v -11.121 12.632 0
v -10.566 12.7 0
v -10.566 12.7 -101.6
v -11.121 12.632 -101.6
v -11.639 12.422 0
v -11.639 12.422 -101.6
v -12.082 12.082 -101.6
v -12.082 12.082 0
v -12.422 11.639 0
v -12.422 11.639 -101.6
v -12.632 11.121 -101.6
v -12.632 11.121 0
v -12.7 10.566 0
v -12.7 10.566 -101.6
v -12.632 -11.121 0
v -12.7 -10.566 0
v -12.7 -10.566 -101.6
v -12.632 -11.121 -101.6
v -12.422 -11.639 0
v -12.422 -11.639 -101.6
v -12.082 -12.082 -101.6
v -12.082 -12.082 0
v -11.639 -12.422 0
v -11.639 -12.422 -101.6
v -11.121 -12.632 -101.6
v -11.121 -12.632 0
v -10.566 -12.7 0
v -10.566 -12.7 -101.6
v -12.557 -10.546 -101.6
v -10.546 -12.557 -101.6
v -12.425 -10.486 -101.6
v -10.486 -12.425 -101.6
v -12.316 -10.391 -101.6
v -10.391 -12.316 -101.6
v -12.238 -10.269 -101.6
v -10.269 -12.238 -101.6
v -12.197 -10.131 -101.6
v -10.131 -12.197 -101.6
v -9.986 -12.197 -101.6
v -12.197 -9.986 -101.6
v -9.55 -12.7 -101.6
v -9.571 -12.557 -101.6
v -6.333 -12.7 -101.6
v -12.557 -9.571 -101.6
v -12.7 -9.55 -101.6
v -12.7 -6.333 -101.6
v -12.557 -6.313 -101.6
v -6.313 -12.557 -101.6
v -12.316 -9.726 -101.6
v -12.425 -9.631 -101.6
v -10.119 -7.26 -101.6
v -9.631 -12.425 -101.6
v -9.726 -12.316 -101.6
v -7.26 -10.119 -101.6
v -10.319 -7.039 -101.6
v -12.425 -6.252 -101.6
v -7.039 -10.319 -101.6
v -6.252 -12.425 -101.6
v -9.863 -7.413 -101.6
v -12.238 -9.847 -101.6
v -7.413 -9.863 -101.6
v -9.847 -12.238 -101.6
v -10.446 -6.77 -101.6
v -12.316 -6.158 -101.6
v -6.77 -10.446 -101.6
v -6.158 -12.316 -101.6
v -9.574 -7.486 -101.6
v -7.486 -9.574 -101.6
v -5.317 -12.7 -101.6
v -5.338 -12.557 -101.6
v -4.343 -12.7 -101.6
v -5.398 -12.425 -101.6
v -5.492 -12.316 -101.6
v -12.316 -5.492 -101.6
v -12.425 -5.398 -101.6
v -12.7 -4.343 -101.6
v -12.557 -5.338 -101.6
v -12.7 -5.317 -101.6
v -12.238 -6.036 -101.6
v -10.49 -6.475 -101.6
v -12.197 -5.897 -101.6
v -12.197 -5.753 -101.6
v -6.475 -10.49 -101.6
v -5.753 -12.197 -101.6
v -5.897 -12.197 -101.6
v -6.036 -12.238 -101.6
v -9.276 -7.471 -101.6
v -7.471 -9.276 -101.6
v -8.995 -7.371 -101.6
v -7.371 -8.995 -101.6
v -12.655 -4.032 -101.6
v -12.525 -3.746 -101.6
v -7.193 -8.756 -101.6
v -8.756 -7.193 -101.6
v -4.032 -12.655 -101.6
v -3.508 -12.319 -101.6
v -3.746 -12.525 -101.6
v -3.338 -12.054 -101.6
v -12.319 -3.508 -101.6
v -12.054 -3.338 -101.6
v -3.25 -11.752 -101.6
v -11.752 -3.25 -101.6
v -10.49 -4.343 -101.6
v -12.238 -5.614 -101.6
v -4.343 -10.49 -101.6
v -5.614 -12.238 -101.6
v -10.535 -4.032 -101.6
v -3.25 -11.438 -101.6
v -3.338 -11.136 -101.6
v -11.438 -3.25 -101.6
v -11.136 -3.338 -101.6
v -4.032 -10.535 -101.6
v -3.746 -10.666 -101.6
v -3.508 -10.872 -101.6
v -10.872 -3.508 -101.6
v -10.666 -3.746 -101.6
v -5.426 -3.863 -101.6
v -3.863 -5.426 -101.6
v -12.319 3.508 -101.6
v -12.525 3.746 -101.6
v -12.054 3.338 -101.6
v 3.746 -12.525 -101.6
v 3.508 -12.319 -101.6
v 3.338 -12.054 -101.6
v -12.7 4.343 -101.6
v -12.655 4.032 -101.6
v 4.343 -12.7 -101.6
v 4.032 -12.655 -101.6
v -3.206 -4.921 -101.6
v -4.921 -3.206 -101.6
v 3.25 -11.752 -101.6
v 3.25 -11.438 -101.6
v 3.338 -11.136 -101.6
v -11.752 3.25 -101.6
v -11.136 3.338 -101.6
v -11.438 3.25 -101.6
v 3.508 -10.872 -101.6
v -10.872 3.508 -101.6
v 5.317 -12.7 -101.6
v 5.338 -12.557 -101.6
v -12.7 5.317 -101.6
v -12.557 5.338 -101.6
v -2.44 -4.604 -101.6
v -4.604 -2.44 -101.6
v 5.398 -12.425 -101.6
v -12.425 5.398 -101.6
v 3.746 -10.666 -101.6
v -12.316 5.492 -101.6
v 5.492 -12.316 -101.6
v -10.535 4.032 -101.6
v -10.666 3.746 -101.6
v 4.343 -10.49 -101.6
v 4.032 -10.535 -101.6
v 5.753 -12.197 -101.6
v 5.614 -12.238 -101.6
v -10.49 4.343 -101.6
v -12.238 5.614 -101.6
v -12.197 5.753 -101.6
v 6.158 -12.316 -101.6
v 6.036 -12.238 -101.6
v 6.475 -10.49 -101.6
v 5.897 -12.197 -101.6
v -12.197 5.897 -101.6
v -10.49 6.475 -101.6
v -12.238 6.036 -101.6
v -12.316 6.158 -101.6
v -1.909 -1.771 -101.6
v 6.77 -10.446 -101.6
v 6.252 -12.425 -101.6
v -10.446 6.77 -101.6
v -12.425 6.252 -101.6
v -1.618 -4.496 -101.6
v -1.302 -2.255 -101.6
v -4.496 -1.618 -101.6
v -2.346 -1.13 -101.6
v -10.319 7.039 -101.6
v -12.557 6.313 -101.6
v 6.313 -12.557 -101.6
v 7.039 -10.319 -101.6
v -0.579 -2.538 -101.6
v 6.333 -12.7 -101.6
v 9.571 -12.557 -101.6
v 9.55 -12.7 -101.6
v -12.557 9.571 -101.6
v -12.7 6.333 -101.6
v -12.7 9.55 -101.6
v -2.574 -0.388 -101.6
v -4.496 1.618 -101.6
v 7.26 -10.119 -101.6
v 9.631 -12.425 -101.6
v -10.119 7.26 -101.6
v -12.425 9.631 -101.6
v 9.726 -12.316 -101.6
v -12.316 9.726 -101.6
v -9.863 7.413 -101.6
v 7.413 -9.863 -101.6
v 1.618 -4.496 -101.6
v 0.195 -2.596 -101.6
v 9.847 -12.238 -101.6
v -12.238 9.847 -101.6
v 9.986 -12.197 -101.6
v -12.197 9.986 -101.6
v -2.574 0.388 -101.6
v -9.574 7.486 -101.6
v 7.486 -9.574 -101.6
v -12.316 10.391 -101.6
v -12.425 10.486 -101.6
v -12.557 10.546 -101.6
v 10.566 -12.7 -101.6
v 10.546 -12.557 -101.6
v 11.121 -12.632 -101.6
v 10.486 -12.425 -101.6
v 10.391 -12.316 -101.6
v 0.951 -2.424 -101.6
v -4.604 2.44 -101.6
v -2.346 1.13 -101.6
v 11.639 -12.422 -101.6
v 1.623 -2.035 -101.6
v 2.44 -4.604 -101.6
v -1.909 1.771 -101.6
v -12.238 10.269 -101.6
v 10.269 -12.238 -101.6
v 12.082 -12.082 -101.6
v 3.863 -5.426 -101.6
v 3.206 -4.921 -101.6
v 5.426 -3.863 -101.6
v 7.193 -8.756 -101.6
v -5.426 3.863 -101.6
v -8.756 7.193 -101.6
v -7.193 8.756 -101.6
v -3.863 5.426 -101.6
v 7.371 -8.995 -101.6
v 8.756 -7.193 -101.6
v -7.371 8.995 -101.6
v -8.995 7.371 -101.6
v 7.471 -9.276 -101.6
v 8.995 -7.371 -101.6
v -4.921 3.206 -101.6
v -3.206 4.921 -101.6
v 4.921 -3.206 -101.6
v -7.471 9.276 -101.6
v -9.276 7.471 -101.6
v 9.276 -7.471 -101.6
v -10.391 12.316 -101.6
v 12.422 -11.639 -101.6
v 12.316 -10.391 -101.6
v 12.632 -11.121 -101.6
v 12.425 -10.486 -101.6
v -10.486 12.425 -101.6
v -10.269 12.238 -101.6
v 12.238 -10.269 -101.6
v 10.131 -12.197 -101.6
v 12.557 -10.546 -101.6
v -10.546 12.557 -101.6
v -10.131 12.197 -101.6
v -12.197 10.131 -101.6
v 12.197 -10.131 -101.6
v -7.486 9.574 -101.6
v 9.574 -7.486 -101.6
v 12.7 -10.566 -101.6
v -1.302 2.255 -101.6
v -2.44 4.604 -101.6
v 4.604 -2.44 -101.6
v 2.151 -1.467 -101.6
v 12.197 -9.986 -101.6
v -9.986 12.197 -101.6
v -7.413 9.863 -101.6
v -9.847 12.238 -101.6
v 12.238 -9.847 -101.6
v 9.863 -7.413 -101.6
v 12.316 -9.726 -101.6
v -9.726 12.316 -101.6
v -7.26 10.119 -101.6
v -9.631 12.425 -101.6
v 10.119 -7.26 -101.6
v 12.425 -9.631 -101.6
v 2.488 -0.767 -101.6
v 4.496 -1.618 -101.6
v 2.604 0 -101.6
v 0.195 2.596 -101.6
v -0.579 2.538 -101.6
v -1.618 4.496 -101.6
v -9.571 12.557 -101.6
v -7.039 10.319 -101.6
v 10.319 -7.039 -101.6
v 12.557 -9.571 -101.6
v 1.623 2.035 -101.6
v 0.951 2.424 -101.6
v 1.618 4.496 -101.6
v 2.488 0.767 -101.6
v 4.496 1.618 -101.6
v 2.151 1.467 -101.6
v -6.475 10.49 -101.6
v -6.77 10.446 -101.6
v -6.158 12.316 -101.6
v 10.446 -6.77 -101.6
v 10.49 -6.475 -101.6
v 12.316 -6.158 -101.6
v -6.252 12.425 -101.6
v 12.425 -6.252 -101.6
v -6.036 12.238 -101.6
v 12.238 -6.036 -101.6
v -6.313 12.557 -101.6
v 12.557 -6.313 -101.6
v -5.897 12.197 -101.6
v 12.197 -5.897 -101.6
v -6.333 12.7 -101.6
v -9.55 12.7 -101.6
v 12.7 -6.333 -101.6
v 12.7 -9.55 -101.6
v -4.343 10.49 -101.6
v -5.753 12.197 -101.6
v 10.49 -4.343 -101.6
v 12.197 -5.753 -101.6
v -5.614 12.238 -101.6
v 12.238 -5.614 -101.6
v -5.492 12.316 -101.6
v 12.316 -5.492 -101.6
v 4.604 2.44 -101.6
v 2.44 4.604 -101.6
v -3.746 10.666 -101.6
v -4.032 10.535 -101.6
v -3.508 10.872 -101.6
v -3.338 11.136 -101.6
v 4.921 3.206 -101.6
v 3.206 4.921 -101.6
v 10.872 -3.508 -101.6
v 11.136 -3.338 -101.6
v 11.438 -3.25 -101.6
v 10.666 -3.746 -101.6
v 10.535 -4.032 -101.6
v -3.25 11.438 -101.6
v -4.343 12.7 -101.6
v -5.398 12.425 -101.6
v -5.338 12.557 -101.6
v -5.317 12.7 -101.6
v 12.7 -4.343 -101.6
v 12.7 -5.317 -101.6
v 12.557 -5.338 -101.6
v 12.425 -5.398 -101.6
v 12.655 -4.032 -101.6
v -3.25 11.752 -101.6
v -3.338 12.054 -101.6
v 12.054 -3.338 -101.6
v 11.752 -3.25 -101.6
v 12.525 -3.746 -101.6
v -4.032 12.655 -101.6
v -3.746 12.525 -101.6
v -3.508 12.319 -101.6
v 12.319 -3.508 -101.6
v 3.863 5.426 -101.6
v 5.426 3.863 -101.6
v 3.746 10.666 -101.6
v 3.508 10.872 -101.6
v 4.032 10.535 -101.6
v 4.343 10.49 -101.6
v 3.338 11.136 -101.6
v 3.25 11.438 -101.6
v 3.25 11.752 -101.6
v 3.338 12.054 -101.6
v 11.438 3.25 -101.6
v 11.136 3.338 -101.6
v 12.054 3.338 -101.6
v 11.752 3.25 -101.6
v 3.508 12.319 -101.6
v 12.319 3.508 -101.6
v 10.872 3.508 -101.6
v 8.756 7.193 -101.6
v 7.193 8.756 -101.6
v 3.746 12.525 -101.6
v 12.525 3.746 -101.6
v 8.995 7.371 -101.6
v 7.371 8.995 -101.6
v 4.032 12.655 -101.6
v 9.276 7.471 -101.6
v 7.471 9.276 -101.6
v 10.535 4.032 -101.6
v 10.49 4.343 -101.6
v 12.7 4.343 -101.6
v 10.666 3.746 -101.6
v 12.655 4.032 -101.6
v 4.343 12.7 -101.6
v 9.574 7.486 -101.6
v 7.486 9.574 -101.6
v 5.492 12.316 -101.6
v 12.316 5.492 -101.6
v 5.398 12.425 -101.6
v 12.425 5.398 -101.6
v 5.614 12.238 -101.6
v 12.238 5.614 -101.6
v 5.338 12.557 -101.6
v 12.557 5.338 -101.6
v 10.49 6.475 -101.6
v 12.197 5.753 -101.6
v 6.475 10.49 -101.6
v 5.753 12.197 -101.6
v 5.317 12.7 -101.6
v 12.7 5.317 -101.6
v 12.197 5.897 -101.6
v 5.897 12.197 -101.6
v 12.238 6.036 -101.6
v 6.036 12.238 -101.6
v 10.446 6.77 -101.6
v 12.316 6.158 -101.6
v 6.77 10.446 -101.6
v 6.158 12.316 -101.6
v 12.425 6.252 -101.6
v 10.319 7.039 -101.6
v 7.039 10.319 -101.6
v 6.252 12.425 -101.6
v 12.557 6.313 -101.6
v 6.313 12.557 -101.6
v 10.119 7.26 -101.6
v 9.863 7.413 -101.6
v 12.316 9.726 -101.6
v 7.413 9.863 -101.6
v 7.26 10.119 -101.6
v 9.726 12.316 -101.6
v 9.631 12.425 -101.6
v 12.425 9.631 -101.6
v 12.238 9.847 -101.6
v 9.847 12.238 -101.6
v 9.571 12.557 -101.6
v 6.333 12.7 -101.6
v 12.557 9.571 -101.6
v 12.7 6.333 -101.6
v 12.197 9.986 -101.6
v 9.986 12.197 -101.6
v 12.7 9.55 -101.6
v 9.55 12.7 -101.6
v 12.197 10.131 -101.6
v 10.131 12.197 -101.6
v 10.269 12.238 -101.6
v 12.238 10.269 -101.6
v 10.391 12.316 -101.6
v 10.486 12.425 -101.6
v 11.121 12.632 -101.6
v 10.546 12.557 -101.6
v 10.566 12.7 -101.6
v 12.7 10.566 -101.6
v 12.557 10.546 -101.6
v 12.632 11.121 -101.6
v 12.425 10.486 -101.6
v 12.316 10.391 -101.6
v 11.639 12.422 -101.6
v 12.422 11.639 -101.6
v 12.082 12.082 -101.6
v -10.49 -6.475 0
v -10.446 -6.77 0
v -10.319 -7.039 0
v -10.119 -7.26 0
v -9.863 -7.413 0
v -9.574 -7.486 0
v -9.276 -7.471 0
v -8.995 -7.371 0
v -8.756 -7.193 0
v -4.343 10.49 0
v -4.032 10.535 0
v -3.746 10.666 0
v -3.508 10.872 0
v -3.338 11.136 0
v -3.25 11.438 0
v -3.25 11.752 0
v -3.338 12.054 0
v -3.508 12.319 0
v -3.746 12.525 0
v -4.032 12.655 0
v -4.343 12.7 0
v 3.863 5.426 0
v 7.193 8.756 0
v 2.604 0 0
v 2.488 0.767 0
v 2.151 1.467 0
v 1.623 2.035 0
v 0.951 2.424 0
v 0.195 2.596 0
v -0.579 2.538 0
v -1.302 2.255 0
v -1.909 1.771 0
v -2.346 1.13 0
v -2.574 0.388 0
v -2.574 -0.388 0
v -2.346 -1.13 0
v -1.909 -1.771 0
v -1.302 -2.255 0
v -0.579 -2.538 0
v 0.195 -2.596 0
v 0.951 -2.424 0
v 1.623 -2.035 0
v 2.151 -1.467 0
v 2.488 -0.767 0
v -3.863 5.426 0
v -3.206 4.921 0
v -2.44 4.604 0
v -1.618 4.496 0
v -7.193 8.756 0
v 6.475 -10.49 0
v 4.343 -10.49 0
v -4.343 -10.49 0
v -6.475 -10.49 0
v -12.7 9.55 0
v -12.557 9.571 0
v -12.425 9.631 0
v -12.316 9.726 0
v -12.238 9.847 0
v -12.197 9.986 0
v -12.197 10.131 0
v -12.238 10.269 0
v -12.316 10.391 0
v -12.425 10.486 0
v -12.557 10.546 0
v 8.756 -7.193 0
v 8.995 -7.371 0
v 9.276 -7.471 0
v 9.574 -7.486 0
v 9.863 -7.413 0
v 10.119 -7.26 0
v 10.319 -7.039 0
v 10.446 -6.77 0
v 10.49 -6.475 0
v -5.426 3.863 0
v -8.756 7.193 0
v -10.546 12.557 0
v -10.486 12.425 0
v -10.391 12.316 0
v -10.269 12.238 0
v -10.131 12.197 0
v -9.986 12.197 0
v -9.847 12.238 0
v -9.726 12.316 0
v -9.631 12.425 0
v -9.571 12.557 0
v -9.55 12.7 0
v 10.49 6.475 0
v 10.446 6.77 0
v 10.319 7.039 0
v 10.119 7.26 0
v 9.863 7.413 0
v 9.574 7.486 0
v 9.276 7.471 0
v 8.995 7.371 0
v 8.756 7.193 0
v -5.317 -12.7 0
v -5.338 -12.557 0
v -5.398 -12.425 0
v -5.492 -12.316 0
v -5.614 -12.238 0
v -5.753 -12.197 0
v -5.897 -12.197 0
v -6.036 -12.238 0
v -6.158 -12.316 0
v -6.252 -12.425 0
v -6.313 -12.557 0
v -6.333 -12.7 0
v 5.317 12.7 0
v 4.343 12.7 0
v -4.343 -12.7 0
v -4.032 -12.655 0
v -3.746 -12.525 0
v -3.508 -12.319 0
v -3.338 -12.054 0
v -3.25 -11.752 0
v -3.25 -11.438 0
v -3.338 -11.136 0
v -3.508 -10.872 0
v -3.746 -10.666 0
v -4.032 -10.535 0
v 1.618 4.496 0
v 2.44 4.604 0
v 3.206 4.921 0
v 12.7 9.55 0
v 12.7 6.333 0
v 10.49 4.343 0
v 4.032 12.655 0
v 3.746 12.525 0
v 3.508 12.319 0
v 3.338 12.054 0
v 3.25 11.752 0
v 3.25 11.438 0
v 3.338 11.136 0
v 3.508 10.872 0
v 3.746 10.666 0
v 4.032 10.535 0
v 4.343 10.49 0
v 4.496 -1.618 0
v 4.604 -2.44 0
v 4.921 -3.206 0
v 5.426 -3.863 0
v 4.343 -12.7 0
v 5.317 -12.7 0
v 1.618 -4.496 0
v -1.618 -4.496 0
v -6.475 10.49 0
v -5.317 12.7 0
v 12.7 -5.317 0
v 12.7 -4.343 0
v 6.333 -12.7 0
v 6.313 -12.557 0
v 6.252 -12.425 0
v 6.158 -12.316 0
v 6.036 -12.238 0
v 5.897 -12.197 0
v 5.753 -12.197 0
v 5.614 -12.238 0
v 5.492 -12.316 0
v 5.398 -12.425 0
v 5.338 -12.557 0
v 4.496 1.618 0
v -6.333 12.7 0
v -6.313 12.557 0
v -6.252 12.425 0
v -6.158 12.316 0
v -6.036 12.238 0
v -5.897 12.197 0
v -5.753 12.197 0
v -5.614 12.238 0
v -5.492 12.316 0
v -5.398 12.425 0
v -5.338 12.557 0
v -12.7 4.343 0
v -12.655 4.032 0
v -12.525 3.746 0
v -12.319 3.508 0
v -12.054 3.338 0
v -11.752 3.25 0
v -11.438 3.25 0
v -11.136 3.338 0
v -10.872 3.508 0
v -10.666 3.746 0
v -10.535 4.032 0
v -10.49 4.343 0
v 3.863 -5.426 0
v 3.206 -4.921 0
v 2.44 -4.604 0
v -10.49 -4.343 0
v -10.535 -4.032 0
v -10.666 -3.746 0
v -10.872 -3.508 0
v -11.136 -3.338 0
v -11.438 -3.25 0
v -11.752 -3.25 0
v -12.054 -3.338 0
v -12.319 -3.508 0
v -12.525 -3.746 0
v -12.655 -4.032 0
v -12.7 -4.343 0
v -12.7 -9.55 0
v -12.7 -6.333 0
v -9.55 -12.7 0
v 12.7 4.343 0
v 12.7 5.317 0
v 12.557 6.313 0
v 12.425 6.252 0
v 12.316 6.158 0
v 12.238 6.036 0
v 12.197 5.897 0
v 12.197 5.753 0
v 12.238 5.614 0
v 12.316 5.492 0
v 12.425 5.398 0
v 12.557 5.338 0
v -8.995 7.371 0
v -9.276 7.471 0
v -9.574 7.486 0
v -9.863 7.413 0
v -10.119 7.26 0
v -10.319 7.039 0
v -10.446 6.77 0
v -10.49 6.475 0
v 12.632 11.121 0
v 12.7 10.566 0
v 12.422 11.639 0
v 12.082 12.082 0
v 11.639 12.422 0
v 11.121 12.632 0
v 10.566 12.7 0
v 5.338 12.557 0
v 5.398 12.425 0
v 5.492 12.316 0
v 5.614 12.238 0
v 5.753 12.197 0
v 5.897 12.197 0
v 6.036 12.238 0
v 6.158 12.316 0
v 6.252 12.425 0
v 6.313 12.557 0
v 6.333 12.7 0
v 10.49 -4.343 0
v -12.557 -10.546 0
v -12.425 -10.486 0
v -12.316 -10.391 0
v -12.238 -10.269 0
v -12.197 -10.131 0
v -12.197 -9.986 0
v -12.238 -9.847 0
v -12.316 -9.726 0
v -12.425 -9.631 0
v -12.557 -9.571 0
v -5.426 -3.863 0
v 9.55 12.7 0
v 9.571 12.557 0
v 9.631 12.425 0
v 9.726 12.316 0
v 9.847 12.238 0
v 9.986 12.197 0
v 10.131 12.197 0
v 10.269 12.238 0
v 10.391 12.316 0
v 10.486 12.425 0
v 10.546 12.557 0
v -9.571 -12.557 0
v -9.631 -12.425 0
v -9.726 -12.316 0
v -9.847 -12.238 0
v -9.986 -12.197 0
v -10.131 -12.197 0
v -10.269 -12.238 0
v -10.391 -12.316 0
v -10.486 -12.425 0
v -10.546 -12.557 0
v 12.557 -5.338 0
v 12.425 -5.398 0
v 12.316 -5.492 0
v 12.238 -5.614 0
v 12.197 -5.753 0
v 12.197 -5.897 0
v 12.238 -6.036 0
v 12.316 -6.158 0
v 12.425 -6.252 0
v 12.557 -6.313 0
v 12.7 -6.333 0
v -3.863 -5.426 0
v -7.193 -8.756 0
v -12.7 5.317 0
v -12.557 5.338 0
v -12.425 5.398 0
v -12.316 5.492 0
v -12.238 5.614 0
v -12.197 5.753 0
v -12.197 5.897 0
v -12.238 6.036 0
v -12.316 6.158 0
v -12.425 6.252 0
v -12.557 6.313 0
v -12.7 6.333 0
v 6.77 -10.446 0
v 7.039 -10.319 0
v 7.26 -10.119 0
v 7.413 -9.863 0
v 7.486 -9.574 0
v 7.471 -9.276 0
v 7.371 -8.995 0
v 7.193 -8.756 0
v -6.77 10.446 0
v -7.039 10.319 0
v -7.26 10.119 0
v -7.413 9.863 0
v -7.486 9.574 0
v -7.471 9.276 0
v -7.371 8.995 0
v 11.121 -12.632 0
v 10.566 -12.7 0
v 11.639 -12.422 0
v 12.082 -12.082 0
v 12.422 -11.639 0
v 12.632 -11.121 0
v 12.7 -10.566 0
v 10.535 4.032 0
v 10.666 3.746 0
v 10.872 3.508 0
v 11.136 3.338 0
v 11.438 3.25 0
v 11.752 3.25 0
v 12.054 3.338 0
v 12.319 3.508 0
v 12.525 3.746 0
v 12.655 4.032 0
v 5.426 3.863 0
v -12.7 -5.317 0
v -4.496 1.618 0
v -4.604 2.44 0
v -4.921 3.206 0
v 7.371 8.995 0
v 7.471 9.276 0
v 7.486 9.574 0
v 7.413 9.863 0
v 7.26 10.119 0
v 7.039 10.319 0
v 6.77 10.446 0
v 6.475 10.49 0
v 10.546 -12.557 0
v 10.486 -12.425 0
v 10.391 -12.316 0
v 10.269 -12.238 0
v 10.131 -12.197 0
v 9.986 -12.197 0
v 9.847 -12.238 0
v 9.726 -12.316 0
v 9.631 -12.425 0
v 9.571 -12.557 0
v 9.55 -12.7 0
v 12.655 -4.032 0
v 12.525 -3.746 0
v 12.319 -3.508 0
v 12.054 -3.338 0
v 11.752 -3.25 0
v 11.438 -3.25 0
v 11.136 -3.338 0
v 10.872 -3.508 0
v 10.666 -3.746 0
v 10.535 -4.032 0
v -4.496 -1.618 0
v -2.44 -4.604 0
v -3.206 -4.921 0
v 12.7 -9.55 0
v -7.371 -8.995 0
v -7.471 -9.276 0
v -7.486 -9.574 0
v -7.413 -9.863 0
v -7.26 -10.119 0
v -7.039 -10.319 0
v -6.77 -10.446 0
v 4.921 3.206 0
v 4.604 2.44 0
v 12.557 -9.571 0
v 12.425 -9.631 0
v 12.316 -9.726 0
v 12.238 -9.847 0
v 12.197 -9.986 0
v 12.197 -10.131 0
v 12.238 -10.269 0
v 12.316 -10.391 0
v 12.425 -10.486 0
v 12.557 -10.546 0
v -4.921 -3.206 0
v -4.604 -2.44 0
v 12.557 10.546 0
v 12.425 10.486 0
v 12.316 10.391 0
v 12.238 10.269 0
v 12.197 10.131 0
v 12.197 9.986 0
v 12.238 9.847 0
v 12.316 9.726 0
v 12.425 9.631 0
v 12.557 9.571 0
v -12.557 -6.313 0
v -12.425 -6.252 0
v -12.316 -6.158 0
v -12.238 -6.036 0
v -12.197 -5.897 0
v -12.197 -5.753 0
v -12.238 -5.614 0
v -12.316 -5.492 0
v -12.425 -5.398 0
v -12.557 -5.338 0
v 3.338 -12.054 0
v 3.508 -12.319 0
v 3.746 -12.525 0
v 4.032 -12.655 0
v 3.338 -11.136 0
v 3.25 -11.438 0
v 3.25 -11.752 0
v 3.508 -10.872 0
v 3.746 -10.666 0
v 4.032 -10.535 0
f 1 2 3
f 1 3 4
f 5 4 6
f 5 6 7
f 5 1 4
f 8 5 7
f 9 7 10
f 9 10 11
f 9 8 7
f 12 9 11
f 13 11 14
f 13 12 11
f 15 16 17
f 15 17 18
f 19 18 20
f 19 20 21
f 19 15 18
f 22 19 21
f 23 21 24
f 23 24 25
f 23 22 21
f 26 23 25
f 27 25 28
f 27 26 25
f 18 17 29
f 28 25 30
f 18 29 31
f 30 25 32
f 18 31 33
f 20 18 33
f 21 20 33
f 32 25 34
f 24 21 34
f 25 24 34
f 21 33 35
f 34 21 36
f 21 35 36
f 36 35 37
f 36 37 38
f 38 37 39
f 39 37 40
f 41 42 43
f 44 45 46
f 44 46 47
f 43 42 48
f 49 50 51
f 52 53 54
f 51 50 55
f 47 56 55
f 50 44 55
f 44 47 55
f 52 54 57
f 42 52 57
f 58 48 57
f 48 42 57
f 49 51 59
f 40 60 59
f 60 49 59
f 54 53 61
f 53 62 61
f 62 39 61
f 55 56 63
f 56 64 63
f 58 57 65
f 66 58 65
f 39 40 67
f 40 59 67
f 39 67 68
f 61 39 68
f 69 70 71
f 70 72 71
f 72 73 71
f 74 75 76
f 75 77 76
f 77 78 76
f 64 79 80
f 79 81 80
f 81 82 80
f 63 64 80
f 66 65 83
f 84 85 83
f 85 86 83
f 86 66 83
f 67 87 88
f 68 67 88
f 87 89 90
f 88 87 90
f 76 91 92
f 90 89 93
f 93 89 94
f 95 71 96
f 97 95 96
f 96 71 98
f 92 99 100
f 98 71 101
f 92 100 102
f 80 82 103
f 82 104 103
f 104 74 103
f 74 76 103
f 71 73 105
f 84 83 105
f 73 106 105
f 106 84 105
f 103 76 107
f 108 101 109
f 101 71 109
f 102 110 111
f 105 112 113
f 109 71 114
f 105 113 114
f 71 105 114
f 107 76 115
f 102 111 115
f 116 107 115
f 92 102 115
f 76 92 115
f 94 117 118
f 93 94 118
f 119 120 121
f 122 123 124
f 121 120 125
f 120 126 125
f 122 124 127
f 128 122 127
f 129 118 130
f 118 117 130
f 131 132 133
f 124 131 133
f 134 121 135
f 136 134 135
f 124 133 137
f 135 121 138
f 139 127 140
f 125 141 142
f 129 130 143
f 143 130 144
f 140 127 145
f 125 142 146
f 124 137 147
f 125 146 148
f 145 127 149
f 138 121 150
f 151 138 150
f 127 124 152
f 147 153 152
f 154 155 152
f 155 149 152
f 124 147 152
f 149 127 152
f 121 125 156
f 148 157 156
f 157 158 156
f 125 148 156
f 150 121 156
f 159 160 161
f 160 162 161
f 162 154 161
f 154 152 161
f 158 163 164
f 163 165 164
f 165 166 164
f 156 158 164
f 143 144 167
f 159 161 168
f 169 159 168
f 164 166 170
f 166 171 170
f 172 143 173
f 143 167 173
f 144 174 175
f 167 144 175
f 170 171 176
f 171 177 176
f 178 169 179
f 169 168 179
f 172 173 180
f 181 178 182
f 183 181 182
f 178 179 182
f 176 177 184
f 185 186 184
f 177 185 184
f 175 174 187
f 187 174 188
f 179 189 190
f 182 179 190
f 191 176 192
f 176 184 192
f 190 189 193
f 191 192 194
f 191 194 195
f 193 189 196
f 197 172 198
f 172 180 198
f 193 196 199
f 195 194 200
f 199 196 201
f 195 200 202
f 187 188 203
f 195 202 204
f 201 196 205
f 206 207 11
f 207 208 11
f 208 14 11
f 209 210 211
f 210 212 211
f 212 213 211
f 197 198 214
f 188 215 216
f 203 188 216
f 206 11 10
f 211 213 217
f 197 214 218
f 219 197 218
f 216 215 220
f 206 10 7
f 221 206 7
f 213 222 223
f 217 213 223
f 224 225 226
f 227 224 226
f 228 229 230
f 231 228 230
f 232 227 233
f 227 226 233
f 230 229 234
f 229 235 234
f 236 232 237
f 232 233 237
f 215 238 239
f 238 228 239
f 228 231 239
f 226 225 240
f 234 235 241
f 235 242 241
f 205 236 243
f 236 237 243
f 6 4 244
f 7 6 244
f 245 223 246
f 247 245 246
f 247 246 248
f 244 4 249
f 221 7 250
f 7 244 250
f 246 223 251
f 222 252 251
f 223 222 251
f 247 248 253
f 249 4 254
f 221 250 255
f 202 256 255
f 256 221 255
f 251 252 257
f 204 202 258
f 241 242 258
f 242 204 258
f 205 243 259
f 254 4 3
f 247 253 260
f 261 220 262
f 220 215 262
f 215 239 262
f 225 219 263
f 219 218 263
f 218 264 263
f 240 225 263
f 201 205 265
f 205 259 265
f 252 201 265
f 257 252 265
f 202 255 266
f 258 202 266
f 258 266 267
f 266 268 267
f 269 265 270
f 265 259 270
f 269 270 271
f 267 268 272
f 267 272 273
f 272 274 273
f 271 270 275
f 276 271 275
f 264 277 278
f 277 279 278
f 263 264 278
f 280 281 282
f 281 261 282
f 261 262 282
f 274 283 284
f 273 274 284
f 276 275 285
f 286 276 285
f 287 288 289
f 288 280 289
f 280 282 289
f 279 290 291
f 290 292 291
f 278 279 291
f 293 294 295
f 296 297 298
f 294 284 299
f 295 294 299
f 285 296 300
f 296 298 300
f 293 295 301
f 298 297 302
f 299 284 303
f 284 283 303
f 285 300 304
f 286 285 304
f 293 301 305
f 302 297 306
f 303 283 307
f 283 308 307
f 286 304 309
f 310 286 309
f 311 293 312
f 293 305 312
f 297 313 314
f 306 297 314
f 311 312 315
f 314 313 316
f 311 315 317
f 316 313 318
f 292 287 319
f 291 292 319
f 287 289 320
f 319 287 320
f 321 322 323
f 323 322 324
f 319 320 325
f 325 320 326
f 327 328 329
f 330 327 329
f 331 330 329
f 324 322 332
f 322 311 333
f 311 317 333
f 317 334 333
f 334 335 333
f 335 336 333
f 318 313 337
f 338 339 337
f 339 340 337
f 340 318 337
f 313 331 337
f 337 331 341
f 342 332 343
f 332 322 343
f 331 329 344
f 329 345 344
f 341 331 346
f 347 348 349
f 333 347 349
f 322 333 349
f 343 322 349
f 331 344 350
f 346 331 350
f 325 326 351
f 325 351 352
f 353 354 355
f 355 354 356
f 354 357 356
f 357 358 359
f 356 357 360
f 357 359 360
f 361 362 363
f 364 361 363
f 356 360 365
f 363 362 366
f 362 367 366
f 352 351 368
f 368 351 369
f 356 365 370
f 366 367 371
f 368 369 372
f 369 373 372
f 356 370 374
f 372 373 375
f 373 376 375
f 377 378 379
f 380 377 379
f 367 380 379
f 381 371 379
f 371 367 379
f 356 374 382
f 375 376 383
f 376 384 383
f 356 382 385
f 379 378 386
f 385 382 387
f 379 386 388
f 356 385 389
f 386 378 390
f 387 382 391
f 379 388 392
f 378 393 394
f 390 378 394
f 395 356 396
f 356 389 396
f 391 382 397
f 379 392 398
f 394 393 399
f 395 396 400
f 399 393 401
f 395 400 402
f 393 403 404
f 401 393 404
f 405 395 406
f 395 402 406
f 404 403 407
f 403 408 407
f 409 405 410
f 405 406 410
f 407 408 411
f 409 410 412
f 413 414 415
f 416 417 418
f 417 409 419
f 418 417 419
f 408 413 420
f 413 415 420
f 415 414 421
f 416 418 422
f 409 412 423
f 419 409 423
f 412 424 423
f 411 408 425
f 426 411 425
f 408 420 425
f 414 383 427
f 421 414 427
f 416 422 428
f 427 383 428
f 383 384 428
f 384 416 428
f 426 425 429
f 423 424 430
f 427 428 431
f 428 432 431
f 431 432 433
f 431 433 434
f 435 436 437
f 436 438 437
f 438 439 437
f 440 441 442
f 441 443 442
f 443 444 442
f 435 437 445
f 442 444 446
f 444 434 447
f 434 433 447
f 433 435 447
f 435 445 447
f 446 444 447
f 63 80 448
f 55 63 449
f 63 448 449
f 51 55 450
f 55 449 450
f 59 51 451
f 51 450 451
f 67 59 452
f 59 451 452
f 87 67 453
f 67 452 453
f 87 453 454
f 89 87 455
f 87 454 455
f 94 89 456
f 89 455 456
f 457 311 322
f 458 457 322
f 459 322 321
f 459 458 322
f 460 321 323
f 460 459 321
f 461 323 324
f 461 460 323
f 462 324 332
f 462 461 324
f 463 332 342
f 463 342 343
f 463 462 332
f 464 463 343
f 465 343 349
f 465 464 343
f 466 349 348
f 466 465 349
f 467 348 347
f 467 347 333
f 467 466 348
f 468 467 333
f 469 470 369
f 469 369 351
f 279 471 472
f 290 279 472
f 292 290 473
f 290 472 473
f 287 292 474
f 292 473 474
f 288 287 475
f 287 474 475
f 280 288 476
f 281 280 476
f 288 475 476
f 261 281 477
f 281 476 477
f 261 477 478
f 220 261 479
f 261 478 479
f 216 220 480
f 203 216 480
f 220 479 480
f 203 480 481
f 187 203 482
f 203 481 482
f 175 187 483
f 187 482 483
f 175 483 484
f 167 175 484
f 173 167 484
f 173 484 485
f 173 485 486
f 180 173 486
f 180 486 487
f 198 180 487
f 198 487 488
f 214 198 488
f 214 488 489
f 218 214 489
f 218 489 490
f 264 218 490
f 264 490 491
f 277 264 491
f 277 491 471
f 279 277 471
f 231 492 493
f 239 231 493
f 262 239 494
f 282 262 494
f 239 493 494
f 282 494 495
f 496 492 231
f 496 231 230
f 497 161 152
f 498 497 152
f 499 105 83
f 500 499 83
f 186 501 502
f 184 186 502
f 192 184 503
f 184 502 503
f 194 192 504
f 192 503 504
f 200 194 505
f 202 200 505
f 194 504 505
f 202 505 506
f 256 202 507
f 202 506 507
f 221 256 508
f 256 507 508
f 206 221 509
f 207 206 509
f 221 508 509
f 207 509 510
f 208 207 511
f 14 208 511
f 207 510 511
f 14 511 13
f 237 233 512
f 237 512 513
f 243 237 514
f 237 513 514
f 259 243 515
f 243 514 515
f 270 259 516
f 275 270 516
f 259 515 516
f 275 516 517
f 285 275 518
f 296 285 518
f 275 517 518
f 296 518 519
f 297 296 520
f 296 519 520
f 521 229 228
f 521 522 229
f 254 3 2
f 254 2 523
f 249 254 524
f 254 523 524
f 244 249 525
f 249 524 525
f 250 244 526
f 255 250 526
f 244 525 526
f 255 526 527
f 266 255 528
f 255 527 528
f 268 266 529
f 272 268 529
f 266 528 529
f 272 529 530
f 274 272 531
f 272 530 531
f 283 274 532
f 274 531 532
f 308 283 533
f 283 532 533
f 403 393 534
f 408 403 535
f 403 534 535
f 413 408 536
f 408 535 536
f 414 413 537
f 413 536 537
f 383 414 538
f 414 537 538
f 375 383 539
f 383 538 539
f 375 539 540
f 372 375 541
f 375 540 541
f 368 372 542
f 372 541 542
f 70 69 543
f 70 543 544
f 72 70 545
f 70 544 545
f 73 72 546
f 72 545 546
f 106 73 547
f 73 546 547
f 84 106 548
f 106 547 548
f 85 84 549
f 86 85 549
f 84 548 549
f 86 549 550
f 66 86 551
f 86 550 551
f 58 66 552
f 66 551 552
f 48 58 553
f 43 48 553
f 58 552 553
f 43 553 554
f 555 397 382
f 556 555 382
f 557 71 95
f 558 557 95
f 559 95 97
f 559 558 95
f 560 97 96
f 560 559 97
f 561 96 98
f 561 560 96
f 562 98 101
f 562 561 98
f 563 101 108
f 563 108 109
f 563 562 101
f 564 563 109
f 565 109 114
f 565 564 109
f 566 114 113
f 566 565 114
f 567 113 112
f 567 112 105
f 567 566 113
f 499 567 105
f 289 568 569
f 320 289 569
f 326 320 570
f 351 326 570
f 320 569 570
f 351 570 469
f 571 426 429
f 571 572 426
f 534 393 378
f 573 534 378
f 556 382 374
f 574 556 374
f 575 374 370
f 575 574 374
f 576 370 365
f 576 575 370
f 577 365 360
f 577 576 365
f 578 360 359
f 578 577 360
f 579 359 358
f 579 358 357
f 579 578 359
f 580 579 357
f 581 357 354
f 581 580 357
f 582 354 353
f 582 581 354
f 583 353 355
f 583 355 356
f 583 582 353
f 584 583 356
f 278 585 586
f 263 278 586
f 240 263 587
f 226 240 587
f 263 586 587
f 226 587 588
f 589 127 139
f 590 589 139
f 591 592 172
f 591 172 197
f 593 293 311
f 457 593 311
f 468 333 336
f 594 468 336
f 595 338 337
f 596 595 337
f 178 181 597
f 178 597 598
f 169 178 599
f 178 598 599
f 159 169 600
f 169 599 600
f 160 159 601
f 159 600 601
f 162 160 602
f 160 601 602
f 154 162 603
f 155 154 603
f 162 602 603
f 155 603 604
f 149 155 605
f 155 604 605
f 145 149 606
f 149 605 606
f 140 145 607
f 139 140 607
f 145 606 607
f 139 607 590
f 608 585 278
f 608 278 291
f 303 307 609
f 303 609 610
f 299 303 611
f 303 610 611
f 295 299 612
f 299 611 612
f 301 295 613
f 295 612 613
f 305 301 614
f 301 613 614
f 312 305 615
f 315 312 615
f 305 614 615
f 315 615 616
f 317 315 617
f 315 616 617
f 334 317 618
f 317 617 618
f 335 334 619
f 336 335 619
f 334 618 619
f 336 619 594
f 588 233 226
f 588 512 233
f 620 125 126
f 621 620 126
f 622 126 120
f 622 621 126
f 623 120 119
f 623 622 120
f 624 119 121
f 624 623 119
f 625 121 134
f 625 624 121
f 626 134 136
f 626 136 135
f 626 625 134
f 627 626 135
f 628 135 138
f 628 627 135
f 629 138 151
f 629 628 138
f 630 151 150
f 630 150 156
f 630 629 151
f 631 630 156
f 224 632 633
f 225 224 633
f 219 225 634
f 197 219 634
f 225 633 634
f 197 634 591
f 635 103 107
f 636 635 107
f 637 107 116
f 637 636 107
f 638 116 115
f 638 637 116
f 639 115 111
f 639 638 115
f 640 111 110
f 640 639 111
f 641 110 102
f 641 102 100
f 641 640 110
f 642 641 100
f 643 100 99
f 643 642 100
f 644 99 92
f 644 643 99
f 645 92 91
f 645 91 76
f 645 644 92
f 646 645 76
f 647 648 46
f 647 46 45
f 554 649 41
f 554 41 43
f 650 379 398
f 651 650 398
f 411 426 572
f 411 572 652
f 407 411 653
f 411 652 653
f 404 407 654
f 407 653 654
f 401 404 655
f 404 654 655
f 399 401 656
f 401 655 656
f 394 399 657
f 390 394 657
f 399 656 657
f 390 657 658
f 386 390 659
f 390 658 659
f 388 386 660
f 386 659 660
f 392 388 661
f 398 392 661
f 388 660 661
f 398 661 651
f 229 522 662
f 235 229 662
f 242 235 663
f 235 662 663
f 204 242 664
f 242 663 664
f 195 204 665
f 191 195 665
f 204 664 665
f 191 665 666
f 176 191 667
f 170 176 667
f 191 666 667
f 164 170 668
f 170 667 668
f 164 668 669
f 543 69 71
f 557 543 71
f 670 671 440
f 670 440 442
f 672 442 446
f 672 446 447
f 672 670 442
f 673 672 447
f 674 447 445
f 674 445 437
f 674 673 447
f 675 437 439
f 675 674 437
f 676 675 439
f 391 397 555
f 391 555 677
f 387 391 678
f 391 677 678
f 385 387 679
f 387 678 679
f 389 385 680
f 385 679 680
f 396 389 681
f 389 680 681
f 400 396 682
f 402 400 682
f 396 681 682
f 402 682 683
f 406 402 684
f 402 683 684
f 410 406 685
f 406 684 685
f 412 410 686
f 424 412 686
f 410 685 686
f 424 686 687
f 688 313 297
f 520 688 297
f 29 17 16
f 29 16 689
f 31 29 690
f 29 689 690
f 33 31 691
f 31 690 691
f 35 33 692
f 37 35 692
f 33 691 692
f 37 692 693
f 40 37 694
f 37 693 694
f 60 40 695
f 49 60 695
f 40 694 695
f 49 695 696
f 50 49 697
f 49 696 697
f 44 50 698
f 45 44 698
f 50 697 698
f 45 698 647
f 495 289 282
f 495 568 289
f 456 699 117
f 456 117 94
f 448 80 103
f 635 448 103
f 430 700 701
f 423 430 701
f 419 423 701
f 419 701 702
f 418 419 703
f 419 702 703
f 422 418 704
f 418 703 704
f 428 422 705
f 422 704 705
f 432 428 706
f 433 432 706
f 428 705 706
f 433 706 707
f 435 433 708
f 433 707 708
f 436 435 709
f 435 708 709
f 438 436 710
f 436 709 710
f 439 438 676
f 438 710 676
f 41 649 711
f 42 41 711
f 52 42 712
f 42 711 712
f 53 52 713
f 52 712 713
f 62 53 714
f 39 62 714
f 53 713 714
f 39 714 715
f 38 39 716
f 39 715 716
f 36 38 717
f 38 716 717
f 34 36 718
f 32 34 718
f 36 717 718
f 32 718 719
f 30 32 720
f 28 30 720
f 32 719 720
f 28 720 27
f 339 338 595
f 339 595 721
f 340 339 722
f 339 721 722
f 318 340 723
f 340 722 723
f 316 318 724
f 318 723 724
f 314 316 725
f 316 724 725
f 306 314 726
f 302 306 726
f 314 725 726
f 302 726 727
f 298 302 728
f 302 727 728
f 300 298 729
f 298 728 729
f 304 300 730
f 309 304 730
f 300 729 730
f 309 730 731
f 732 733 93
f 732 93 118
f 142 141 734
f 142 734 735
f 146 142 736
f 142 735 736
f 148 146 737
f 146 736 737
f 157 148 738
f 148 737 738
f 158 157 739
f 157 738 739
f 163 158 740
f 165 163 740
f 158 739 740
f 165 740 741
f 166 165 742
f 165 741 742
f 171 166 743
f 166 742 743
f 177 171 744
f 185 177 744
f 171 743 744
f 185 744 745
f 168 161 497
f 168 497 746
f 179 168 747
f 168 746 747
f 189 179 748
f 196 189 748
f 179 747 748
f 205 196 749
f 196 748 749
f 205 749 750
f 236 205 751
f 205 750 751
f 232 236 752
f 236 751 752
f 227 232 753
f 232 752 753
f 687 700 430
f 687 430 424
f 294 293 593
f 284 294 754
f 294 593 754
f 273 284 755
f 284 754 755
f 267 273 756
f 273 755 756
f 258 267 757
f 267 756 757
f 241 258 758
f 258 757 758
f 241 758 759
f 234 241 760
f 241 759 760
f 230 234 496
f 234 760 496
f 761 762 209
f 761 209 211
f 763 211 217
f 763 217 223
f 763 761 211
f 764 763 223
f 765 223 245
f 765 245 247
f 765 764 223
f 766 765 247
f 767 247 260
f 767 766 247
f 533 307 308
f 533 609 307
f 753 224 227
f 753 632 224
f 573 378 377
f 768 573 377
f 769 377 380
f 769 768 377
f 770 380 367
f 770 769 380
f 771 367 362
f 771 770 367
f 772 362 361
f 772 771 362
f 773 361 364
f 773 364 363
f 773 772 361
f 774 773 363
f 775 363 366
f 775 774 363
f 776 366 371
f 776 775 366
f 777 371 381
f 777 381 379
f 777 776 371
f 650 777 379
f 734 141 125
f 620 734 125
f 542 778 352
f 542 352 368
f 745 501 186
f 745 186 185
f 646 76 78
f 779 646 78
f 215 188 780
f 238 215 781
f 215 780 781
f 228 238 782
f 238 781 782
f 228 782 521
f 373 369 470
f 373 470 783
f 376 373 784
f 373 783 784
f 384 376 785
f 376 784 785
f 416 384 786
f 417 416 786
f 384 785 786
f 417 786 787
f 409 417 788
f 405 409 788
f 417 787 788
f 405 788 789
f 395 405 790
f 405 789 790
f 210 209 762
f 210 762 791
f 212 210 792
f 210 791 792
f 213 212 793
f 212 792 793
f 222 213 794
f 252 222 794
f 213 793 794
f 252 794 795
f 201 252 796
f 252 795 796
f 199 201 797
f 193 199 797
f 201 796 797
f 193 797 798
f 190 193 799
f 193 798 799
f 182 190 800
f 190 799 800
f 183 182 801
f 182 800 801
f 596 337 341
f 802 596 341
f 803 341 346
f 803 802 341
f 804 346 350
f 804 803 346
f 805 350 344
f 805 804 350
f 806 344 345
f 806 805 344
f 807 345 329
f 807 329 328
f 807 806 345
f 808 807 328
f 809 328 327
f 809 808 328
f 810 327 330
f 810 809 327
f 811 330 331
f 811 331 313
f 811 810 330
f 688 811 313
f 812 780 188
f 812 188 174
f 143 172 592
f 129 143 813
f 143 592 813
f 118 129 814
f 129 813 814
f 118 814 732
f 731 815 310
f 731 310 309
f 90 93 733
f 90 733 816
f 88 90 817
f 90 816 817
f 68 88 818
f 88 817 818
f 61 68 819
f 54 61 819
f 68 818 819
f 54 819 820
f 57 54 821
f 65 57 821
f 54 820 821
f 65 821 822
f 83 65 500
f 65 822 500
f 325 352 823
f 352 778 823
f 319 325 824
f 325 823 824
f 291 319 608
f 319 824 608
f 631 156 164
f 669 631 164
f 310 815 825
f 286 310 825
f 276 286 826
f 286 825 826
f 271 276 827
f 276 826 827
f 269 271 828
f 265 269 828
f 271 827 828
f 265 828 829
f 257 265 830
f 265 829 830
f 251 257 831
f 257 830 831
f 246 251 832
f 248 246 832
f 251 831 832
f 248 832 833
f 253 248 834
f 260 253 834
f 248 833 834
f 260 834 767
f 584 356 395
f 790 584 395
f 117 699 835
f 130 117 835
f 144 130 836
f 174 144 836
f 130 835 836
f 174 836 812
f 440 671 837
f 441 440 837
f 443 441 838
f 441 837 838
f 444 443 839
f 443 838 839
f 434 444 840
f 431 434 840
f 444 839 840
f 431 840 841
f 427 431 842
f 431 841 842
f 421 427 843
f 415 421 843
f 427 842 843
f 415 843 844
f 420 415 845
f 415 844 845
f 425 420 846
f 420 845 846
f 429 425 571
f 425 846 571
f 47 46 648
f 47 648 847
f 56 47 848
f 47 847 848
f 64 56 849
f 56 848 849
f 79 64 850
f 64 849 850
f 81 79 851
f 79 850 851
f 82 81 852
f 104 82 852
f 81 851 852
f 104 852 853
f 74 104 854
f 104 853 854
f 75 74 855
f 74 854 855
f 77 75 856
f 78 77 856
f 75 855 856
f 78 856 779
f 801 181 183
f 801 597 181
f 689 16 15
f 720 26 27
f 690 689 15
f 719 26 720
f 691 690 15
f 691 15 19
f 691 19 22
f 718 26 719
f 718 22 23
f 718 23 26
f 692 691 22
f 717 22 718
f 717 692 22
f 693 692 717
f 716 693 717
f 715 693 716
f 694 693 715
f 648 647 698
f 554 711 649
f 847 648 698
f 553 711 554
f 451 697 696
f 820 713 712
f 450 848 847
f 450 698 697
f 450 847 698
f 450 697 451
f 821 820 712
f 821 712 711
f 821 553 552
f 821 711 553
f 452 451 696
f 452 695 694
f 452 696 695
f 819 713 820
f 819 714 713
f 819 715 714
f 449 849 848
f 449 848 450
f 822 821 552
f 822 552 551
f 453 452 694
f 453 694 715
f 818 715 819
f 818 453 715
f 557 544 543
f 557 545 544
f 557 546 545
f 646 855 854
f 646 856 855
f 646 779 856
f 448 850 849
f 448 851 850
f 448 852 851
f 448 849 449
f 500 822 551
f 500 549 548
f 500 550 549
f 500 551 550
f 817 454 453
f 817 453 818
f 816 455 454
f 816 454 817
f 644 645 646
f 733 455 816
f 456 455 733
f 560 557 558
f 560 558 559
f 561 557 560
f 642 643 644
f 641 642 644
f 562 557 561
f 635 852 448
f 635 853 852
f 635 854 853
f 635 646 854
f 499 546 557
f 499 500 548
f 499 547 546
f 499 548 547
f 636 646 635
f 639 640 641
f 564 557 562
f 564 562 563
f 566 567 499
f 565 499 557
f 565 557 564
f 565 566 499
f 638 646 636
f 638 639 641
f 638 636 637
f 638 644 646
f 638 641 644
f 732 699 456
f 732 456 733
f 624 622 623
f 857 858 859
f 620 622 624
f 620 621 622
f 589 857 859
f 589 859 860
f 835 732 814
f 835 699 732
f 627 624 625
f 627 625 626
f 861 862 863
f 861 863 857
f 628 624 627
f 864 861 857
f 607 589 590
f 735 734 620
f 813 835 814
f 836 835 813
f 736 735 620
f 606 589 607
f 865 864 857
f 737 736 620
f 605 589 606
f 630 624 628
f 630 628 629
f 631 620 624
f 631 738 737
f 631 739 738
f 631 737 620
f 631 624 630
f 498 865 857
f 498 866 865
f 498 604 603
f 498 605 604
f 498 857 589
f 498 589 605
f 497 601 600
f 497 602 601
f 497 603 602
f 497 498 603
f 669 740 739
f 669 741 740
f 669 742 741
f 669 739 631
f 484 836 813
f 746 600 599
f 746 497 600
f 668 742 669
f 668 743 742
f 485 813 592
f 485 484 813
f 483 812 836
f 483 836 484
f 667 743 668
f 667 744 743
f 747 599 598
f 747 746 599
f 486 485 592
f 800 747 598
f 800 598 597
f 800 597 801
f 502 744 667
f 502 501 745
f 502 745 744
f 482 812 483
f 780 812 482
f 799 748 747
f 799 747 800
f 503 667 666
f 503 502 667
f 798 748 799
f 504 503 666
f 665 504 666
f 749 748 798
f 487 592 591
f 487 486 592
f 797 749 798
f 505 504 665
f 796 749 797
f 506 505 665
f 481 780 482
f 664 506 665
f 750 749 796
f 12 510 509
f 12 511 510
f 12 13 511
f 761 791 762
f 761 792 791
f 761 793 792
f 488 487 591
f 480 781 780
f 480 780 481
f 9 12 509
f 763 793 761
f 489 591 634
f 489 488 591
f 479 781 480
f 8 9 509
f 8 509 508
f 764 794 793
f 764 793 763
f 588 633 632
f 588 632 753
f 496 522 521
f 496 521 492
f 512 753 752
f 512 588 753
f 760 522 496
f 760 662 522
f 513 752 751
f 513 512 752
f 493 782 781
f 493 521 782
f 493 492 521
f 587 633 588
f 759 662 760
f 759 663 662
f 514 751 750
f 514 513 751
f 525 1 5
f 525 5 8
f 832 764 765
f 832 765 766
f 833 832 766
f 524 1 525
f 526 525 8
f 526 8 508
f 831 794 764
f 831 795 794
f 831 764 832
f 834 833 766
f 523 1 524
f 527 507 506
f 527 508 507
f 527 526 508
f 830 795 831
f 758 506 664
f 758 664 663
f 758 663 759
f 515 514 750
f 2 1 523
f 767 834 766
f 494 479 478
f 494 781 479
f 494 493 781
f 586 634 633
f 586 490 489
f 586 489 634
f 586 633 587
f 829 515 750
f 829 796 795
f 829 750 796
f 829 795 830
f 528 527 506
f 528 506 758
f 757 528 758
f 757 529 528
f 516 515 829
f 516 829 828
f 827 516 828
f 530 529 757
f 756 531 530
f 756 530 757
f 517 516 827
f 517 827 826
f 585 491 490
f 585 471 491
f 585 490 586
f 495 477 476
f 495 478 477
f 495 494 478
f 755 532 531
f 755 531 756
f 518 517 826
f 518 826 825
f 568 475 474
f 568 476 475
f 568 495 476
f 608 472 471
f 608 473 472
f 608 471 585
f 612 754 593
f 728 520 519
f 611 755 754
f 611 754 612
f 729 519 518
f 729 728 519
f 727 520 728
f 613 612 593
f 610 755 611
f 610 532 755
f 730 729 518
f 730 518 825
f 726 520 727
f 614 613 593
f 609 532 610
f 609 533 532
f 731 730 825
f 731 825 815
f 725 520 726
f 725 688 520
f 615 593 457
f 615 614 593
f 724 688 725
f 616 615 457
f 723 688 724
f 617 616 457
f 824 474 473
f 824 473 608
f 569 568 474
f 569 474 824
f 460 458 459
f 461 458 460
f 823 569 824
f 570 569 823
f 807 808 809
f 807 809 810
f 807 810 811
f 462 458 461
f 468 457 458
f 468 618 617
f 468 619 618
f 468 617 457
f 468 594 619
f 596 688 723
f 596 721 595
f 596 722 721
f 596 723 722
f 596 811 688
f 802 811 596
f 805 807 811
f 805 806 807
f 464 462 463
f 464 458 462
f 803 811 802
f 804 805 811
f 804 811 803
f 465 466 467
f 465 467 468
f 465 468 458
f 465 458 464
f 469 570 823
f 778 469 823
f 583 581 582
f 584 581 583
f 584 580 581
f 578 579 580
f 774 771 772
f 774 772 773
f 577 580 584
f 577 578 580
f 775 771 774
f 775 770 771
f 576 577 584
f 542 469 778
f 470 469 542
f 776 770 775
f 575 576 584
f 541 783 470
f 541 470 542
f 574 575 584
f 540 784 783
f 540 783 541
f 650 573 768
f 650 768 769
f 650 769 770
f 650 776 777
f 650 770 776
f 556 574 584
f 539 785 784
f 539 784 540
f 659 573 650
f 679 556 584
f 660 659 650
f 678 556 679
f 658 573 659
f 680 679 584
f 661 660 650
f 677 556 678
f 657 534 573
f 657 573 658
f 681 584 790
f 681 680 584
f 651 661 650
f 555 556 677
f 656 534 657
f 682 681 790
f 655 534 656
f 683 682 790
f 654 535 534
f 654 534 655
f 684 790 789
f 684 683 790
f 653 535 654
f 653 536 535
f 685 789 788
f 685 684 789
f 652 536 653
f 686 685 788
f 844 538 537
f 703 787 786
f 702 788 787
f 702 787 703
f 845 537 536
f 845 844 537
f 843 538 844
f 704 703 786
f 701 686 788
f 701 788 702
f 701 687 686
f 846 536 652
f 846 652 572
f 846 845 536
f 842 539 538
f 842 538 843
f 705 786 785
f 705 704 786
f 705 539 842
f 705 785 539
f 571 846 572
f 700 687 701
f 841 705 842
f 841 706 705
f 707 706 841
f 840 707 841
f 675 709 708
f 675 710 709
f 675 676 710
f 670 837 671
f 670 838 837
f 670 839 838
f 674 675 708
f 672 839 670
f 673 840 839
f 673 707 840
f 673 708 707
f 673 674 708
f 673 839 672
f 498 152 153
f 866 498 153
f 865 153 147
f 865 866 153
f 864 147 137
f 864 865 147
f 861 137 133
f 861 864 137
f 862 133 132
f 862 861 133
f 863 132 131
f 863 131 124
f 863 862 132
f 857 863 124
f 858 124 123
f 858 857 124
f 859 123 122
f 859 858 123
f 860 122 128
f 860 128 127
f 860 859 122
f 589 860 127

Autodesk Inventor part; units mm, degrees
ref_plane "YZ Plane" through (0, 0, 0) normal (1, 0, 0) x (0, 1, 0)
ref_plane "XZ Plane" through (0, 0, 0) normal (0, 1, 0) x (-1, 0, 0)
ref_plane "XY Plane" through (0, 0, 0) normal (0, 0, 1) x (1, 0, 0)
sketch "Sketch_1" plane through (0, 0, 0) normal (0, 0, 1) x (1, 0, 0)
  arc A0 (-12.6998, -10.5664) -> (-10.5664, -12.6998) centre (-10.5918, -10.5918) ccw
  arc A1 (-9.5504, -12.7) -> (-10.5664, -12.6998) centre (-10.0584, -12.7) ccw
  line L0 (-9.5504, -12.7) -> (-6.3331, -12.7)
  arc A2 (-5.3171, -12.7) -> (-6.3331, -12.7) centre (-5.8251, -12.7) ccw
  line L1 (-5.3171, -12.7) -> (-4.3434, -12.7)
  arc A3 (-4.3434, -12.7) -> (-4.3434, -10.4902) centre (-4.3434, -11.5951) ccw
  line L2 (-4.3434, -10.4902) -> (-6.4748, -10.4902)
  arc A4 (-7.1932, -8.7558) -> (-6.4748, -10.4902) centre (-6.4748, -9.4742) ccw
  line L3 (-7.1932, -8.7558) -> (-3.8632, -5.4257)
  arc A5 (-1.6181, -4.4958) -> (-3.8632, -5.4257) centre (-1.6181, -7.6708) ccw
  line L4 (-1.6181, -4.4958) -> (1.6181, -4.4958)
  arc A6 (3.8632, -5.4257) -> (1.6181, -4.4958) centre (1.6181, -7.6708) ccw
  line L5 (3.8632, -5.4257) -> (7.1932, -8.7558)
  arc A7 (6.4748, -10.4902) -> (7.1932, -8.7558) centre (6.4748, -9.4742) ccw
  line L6 (6.4748, -10.4902) -> (4.3434, -10.4902)
  arc A8 (4.3434, -10.4902) -> (4.3434, -12.7) centre (4.3434, -11.5951) ccw
  line L7 (4.3434, -12.7) -> (5.3171, -12.7)
  arc A9 (6.3331, -12.7) -> (5.3171, -12.7) centre (5.8251, -12.7) ccw
  line L8 (6.3331, -12.7) -> (9.5504, -12.7)
  arc A10 (10.5664, -12.6998) -> (9.5504, -12.7) centre (10.0584, -12.7) ccw
  arc A11 (10.5664, -12.6998) -> (12.6998, -10.5664) centre (10.5918, -10.5918) ccw
  arc A12 (12.7, -9.5504) -> (12.6998, -10.5664) centre (12.7, -10.0584) ccw
  line L9 (12.7, -9.5504) -> (12.7, -6.3331)
  arc A13 (12.7, -5.3171) -> (12.7, -6.3331) centre (12.7, -5.8251) ccw
  line L10 (12.7, -5.3171) -> (12.7, -4.3434)
  arc A14 (12.7, -4.3434) -> (10.4902, -4.3434) centre (11.5951, -4.3434) ccw
  line L11 (10.4902, -4.3434) -> (10.4902, -6.4748)
  arc A15 (8.7558, -7.1932) -> (10.4902, -6.4748) centre (9.4742, -6.4748) ccw
  line L12 (8.7558, -7.1932) -> (5.4257, -3.8632)
  arc A16 (4.4958, -1.6181) -> (5.4257, -3.8632) centre (7.6708, -1.6181) ccw
  line L13 (4.4958, -1.6181) -> (4.4958, 1.6181)
  arc A17 (5.4257, 3.8632) -> (4.4958, 1.6181) centre (7.6708, 1.6181) ccw
  line L14 (5.4257, 3.8632) -> (8.7558, 7.1932)
  arc A18 (10.4902, 6.4748) -> (8.7558, 7.1932) centre (9.4742, 6.4748) ccw
  line L15 (10.4902, 6.4748) -> (10.4902, 4.3434)
  arc A19 (10.4902, 4.3434) -> (12.7, 4.3434) centre (11.5951, 4.3434) ccw
  line L16 (12.7, 4.3434) -> (12.7, 5.3171)
  arc A20 (12.7, 6.3331) -> (12.7, 5.3171) centre (12.7, 5.8251) ccw
  line L17 (12.7, 6.3331) -> (12.7, 9.5504)
  arc A21 (12.6998, 10.5664) -> (12.7, 9.5504) centre (12.7, 10.0584) ccw
  arc A22 (12.6998, 10.5664) -> (10.5664, 12.6998) centre (10.5918, 10.5918) ccw
  arc A23 (9.5504, 12.7) -> (10.5664, 12.6998) centre (10.0584, 12.7) ccw
  line L18 (9.5504, 12.7) -> (6.3331, 12.7)
  arc A24 (5.3171, 12.7) -> (6.3331, 12.7) centre (5.8251, 12.7) ccw
  line L19 (5.3171, 12.7) -> (4.3434, 12.7)
  arc A25 (4.3434, 12.7) -> (4.3434, 10.4902) centre (4.3434, 11.5951) ccw
  line L20 (4.3434, 10.4902) -> (6.4748, 10.4902)
  arc A26 (7.1932, 8.7558) -> (6.4748, 10.4902) centre (6.4748, 9.4742) ccw
  line L21 (7.1932, 8.7558) -> (3.8632, 5.4257)
  arc A27 (1.6181, 4.4958) -> (3.8632, 5.4257) centre (1.6181, 7.6708) ccw
  line L22 (1.6181, 4.4958) -> (-1.6181, 4.4958)
  arc A28 (-3.8632, 5.4257) -> (-1.6181, 4.4958) centre (-1.6181, 7.6708) ccw
  line L23 (-3.8632, 5.4257) -> (-7.1932, 8.7558)
  arc A29 (-6.4748, 10.4902) -> (-7.1932, 8.7558) centre (-6.4748, 9.4742) ccw
  line L24 (-6.4748, 10.4902) -> (-4.3434, 10.4902)
  arc A30 (-4.3434, 10.4902) -> (-4.3434, 12.7) centre (-4.3434, 11.5951) ccw
  line L25 (-4.3434, 12.7) -> (-5.3171, 12.7)
  arc A31 (-6.3331, 12.7) -> (-5.3171, 12.7) centre (-5.8251, 12.7) ccw
  line L26 (-6.3331, 12.7) -> (-9.5504, 12.7)
  arc A32 (-10.5664, 12.6998) -> (-9.5504, 12.7) centre (-10.0584, 12.7) ccw
  arc A33 (-10.5664, 12.6998) -> (-12.6998, 10.5664) centre (-10.5918, 10.5918) ccw
  arc A34 (-12.7, 9.5504) -> (-12.6998, 10.5664) centre (-12.7, 10.0584) ccw
  line L27 (-12.7, 9.5504) -> (-12.7, 6.3331)
  arc A35 (-12.7, 5.3171) -> (-12.7, 6.3331) centre (-12.7, 5.8251) ccw
  line L28 (-12.7, 5.3171) -> (-12.7, 4.3434)
  arc A36 (-12.7, 4.3434) -> (-10.4902, 4.3434) centre (-11.5951, 4.3434) ccw
  line L29 (-10.4902, 4.3434) -> (-10.4902, 6.4748)
  arc A37 (-8.7558, 7.1932) -> (-10.4902, 6.4748) centre (-9.4742, 6.4748) ccw
  line L30 (-8.7558, 7.1932) -> (-5.4257, 3.8632)
  arc A38 (-4.4958, 1.6181) -> (-5.4257, 3.8632) centre (-7.6708, 1.6181) ccw
  line L31 (-4.4958, 1.6181) -> (-4.4958, -1.6181)
  arc A39 (-5.4257, -3.8632) -> (-4.4958, -1.6181) centre (-7.6708, -1.6181) ccw
  line L32 (-5.4257, -3.8632) -> (-8.7558, -7.1932)
  arc A40 (-10.4902, -6.4748) -> (-8.7558, -7.1932) centre (-9.4742, -6.4748) ccw
  line L33 (-10.4902, -6.4748) -> (-10.4902, -4.3434)
  arc A41 (-10.4902, -4.3434) -> (-12.7, -4.3434) centre (-11.5951, -4.3434) ccw
  line L34 (-12.7, -4.3434) -> (-12.7, -5.3171)
  arc A42 (-12.7, -6.3331) -> (-12.7, -5.3171) centre (-12.7, -5.8251) ccw
  line L35 (-12.7, -6.3331) -> (-12.7, -9.5504)
  arc A43 (-12.6998, -10.5664) -> (-12.7, -9.5504) centre (-12.7, -10.0584) ccw
  circle A44 centre (0, 0) radius 2.6035
extrude "Extrusion1" add sketch "Sketch_1" against normal blind 101.6
properties part number "1010-15-CL"
